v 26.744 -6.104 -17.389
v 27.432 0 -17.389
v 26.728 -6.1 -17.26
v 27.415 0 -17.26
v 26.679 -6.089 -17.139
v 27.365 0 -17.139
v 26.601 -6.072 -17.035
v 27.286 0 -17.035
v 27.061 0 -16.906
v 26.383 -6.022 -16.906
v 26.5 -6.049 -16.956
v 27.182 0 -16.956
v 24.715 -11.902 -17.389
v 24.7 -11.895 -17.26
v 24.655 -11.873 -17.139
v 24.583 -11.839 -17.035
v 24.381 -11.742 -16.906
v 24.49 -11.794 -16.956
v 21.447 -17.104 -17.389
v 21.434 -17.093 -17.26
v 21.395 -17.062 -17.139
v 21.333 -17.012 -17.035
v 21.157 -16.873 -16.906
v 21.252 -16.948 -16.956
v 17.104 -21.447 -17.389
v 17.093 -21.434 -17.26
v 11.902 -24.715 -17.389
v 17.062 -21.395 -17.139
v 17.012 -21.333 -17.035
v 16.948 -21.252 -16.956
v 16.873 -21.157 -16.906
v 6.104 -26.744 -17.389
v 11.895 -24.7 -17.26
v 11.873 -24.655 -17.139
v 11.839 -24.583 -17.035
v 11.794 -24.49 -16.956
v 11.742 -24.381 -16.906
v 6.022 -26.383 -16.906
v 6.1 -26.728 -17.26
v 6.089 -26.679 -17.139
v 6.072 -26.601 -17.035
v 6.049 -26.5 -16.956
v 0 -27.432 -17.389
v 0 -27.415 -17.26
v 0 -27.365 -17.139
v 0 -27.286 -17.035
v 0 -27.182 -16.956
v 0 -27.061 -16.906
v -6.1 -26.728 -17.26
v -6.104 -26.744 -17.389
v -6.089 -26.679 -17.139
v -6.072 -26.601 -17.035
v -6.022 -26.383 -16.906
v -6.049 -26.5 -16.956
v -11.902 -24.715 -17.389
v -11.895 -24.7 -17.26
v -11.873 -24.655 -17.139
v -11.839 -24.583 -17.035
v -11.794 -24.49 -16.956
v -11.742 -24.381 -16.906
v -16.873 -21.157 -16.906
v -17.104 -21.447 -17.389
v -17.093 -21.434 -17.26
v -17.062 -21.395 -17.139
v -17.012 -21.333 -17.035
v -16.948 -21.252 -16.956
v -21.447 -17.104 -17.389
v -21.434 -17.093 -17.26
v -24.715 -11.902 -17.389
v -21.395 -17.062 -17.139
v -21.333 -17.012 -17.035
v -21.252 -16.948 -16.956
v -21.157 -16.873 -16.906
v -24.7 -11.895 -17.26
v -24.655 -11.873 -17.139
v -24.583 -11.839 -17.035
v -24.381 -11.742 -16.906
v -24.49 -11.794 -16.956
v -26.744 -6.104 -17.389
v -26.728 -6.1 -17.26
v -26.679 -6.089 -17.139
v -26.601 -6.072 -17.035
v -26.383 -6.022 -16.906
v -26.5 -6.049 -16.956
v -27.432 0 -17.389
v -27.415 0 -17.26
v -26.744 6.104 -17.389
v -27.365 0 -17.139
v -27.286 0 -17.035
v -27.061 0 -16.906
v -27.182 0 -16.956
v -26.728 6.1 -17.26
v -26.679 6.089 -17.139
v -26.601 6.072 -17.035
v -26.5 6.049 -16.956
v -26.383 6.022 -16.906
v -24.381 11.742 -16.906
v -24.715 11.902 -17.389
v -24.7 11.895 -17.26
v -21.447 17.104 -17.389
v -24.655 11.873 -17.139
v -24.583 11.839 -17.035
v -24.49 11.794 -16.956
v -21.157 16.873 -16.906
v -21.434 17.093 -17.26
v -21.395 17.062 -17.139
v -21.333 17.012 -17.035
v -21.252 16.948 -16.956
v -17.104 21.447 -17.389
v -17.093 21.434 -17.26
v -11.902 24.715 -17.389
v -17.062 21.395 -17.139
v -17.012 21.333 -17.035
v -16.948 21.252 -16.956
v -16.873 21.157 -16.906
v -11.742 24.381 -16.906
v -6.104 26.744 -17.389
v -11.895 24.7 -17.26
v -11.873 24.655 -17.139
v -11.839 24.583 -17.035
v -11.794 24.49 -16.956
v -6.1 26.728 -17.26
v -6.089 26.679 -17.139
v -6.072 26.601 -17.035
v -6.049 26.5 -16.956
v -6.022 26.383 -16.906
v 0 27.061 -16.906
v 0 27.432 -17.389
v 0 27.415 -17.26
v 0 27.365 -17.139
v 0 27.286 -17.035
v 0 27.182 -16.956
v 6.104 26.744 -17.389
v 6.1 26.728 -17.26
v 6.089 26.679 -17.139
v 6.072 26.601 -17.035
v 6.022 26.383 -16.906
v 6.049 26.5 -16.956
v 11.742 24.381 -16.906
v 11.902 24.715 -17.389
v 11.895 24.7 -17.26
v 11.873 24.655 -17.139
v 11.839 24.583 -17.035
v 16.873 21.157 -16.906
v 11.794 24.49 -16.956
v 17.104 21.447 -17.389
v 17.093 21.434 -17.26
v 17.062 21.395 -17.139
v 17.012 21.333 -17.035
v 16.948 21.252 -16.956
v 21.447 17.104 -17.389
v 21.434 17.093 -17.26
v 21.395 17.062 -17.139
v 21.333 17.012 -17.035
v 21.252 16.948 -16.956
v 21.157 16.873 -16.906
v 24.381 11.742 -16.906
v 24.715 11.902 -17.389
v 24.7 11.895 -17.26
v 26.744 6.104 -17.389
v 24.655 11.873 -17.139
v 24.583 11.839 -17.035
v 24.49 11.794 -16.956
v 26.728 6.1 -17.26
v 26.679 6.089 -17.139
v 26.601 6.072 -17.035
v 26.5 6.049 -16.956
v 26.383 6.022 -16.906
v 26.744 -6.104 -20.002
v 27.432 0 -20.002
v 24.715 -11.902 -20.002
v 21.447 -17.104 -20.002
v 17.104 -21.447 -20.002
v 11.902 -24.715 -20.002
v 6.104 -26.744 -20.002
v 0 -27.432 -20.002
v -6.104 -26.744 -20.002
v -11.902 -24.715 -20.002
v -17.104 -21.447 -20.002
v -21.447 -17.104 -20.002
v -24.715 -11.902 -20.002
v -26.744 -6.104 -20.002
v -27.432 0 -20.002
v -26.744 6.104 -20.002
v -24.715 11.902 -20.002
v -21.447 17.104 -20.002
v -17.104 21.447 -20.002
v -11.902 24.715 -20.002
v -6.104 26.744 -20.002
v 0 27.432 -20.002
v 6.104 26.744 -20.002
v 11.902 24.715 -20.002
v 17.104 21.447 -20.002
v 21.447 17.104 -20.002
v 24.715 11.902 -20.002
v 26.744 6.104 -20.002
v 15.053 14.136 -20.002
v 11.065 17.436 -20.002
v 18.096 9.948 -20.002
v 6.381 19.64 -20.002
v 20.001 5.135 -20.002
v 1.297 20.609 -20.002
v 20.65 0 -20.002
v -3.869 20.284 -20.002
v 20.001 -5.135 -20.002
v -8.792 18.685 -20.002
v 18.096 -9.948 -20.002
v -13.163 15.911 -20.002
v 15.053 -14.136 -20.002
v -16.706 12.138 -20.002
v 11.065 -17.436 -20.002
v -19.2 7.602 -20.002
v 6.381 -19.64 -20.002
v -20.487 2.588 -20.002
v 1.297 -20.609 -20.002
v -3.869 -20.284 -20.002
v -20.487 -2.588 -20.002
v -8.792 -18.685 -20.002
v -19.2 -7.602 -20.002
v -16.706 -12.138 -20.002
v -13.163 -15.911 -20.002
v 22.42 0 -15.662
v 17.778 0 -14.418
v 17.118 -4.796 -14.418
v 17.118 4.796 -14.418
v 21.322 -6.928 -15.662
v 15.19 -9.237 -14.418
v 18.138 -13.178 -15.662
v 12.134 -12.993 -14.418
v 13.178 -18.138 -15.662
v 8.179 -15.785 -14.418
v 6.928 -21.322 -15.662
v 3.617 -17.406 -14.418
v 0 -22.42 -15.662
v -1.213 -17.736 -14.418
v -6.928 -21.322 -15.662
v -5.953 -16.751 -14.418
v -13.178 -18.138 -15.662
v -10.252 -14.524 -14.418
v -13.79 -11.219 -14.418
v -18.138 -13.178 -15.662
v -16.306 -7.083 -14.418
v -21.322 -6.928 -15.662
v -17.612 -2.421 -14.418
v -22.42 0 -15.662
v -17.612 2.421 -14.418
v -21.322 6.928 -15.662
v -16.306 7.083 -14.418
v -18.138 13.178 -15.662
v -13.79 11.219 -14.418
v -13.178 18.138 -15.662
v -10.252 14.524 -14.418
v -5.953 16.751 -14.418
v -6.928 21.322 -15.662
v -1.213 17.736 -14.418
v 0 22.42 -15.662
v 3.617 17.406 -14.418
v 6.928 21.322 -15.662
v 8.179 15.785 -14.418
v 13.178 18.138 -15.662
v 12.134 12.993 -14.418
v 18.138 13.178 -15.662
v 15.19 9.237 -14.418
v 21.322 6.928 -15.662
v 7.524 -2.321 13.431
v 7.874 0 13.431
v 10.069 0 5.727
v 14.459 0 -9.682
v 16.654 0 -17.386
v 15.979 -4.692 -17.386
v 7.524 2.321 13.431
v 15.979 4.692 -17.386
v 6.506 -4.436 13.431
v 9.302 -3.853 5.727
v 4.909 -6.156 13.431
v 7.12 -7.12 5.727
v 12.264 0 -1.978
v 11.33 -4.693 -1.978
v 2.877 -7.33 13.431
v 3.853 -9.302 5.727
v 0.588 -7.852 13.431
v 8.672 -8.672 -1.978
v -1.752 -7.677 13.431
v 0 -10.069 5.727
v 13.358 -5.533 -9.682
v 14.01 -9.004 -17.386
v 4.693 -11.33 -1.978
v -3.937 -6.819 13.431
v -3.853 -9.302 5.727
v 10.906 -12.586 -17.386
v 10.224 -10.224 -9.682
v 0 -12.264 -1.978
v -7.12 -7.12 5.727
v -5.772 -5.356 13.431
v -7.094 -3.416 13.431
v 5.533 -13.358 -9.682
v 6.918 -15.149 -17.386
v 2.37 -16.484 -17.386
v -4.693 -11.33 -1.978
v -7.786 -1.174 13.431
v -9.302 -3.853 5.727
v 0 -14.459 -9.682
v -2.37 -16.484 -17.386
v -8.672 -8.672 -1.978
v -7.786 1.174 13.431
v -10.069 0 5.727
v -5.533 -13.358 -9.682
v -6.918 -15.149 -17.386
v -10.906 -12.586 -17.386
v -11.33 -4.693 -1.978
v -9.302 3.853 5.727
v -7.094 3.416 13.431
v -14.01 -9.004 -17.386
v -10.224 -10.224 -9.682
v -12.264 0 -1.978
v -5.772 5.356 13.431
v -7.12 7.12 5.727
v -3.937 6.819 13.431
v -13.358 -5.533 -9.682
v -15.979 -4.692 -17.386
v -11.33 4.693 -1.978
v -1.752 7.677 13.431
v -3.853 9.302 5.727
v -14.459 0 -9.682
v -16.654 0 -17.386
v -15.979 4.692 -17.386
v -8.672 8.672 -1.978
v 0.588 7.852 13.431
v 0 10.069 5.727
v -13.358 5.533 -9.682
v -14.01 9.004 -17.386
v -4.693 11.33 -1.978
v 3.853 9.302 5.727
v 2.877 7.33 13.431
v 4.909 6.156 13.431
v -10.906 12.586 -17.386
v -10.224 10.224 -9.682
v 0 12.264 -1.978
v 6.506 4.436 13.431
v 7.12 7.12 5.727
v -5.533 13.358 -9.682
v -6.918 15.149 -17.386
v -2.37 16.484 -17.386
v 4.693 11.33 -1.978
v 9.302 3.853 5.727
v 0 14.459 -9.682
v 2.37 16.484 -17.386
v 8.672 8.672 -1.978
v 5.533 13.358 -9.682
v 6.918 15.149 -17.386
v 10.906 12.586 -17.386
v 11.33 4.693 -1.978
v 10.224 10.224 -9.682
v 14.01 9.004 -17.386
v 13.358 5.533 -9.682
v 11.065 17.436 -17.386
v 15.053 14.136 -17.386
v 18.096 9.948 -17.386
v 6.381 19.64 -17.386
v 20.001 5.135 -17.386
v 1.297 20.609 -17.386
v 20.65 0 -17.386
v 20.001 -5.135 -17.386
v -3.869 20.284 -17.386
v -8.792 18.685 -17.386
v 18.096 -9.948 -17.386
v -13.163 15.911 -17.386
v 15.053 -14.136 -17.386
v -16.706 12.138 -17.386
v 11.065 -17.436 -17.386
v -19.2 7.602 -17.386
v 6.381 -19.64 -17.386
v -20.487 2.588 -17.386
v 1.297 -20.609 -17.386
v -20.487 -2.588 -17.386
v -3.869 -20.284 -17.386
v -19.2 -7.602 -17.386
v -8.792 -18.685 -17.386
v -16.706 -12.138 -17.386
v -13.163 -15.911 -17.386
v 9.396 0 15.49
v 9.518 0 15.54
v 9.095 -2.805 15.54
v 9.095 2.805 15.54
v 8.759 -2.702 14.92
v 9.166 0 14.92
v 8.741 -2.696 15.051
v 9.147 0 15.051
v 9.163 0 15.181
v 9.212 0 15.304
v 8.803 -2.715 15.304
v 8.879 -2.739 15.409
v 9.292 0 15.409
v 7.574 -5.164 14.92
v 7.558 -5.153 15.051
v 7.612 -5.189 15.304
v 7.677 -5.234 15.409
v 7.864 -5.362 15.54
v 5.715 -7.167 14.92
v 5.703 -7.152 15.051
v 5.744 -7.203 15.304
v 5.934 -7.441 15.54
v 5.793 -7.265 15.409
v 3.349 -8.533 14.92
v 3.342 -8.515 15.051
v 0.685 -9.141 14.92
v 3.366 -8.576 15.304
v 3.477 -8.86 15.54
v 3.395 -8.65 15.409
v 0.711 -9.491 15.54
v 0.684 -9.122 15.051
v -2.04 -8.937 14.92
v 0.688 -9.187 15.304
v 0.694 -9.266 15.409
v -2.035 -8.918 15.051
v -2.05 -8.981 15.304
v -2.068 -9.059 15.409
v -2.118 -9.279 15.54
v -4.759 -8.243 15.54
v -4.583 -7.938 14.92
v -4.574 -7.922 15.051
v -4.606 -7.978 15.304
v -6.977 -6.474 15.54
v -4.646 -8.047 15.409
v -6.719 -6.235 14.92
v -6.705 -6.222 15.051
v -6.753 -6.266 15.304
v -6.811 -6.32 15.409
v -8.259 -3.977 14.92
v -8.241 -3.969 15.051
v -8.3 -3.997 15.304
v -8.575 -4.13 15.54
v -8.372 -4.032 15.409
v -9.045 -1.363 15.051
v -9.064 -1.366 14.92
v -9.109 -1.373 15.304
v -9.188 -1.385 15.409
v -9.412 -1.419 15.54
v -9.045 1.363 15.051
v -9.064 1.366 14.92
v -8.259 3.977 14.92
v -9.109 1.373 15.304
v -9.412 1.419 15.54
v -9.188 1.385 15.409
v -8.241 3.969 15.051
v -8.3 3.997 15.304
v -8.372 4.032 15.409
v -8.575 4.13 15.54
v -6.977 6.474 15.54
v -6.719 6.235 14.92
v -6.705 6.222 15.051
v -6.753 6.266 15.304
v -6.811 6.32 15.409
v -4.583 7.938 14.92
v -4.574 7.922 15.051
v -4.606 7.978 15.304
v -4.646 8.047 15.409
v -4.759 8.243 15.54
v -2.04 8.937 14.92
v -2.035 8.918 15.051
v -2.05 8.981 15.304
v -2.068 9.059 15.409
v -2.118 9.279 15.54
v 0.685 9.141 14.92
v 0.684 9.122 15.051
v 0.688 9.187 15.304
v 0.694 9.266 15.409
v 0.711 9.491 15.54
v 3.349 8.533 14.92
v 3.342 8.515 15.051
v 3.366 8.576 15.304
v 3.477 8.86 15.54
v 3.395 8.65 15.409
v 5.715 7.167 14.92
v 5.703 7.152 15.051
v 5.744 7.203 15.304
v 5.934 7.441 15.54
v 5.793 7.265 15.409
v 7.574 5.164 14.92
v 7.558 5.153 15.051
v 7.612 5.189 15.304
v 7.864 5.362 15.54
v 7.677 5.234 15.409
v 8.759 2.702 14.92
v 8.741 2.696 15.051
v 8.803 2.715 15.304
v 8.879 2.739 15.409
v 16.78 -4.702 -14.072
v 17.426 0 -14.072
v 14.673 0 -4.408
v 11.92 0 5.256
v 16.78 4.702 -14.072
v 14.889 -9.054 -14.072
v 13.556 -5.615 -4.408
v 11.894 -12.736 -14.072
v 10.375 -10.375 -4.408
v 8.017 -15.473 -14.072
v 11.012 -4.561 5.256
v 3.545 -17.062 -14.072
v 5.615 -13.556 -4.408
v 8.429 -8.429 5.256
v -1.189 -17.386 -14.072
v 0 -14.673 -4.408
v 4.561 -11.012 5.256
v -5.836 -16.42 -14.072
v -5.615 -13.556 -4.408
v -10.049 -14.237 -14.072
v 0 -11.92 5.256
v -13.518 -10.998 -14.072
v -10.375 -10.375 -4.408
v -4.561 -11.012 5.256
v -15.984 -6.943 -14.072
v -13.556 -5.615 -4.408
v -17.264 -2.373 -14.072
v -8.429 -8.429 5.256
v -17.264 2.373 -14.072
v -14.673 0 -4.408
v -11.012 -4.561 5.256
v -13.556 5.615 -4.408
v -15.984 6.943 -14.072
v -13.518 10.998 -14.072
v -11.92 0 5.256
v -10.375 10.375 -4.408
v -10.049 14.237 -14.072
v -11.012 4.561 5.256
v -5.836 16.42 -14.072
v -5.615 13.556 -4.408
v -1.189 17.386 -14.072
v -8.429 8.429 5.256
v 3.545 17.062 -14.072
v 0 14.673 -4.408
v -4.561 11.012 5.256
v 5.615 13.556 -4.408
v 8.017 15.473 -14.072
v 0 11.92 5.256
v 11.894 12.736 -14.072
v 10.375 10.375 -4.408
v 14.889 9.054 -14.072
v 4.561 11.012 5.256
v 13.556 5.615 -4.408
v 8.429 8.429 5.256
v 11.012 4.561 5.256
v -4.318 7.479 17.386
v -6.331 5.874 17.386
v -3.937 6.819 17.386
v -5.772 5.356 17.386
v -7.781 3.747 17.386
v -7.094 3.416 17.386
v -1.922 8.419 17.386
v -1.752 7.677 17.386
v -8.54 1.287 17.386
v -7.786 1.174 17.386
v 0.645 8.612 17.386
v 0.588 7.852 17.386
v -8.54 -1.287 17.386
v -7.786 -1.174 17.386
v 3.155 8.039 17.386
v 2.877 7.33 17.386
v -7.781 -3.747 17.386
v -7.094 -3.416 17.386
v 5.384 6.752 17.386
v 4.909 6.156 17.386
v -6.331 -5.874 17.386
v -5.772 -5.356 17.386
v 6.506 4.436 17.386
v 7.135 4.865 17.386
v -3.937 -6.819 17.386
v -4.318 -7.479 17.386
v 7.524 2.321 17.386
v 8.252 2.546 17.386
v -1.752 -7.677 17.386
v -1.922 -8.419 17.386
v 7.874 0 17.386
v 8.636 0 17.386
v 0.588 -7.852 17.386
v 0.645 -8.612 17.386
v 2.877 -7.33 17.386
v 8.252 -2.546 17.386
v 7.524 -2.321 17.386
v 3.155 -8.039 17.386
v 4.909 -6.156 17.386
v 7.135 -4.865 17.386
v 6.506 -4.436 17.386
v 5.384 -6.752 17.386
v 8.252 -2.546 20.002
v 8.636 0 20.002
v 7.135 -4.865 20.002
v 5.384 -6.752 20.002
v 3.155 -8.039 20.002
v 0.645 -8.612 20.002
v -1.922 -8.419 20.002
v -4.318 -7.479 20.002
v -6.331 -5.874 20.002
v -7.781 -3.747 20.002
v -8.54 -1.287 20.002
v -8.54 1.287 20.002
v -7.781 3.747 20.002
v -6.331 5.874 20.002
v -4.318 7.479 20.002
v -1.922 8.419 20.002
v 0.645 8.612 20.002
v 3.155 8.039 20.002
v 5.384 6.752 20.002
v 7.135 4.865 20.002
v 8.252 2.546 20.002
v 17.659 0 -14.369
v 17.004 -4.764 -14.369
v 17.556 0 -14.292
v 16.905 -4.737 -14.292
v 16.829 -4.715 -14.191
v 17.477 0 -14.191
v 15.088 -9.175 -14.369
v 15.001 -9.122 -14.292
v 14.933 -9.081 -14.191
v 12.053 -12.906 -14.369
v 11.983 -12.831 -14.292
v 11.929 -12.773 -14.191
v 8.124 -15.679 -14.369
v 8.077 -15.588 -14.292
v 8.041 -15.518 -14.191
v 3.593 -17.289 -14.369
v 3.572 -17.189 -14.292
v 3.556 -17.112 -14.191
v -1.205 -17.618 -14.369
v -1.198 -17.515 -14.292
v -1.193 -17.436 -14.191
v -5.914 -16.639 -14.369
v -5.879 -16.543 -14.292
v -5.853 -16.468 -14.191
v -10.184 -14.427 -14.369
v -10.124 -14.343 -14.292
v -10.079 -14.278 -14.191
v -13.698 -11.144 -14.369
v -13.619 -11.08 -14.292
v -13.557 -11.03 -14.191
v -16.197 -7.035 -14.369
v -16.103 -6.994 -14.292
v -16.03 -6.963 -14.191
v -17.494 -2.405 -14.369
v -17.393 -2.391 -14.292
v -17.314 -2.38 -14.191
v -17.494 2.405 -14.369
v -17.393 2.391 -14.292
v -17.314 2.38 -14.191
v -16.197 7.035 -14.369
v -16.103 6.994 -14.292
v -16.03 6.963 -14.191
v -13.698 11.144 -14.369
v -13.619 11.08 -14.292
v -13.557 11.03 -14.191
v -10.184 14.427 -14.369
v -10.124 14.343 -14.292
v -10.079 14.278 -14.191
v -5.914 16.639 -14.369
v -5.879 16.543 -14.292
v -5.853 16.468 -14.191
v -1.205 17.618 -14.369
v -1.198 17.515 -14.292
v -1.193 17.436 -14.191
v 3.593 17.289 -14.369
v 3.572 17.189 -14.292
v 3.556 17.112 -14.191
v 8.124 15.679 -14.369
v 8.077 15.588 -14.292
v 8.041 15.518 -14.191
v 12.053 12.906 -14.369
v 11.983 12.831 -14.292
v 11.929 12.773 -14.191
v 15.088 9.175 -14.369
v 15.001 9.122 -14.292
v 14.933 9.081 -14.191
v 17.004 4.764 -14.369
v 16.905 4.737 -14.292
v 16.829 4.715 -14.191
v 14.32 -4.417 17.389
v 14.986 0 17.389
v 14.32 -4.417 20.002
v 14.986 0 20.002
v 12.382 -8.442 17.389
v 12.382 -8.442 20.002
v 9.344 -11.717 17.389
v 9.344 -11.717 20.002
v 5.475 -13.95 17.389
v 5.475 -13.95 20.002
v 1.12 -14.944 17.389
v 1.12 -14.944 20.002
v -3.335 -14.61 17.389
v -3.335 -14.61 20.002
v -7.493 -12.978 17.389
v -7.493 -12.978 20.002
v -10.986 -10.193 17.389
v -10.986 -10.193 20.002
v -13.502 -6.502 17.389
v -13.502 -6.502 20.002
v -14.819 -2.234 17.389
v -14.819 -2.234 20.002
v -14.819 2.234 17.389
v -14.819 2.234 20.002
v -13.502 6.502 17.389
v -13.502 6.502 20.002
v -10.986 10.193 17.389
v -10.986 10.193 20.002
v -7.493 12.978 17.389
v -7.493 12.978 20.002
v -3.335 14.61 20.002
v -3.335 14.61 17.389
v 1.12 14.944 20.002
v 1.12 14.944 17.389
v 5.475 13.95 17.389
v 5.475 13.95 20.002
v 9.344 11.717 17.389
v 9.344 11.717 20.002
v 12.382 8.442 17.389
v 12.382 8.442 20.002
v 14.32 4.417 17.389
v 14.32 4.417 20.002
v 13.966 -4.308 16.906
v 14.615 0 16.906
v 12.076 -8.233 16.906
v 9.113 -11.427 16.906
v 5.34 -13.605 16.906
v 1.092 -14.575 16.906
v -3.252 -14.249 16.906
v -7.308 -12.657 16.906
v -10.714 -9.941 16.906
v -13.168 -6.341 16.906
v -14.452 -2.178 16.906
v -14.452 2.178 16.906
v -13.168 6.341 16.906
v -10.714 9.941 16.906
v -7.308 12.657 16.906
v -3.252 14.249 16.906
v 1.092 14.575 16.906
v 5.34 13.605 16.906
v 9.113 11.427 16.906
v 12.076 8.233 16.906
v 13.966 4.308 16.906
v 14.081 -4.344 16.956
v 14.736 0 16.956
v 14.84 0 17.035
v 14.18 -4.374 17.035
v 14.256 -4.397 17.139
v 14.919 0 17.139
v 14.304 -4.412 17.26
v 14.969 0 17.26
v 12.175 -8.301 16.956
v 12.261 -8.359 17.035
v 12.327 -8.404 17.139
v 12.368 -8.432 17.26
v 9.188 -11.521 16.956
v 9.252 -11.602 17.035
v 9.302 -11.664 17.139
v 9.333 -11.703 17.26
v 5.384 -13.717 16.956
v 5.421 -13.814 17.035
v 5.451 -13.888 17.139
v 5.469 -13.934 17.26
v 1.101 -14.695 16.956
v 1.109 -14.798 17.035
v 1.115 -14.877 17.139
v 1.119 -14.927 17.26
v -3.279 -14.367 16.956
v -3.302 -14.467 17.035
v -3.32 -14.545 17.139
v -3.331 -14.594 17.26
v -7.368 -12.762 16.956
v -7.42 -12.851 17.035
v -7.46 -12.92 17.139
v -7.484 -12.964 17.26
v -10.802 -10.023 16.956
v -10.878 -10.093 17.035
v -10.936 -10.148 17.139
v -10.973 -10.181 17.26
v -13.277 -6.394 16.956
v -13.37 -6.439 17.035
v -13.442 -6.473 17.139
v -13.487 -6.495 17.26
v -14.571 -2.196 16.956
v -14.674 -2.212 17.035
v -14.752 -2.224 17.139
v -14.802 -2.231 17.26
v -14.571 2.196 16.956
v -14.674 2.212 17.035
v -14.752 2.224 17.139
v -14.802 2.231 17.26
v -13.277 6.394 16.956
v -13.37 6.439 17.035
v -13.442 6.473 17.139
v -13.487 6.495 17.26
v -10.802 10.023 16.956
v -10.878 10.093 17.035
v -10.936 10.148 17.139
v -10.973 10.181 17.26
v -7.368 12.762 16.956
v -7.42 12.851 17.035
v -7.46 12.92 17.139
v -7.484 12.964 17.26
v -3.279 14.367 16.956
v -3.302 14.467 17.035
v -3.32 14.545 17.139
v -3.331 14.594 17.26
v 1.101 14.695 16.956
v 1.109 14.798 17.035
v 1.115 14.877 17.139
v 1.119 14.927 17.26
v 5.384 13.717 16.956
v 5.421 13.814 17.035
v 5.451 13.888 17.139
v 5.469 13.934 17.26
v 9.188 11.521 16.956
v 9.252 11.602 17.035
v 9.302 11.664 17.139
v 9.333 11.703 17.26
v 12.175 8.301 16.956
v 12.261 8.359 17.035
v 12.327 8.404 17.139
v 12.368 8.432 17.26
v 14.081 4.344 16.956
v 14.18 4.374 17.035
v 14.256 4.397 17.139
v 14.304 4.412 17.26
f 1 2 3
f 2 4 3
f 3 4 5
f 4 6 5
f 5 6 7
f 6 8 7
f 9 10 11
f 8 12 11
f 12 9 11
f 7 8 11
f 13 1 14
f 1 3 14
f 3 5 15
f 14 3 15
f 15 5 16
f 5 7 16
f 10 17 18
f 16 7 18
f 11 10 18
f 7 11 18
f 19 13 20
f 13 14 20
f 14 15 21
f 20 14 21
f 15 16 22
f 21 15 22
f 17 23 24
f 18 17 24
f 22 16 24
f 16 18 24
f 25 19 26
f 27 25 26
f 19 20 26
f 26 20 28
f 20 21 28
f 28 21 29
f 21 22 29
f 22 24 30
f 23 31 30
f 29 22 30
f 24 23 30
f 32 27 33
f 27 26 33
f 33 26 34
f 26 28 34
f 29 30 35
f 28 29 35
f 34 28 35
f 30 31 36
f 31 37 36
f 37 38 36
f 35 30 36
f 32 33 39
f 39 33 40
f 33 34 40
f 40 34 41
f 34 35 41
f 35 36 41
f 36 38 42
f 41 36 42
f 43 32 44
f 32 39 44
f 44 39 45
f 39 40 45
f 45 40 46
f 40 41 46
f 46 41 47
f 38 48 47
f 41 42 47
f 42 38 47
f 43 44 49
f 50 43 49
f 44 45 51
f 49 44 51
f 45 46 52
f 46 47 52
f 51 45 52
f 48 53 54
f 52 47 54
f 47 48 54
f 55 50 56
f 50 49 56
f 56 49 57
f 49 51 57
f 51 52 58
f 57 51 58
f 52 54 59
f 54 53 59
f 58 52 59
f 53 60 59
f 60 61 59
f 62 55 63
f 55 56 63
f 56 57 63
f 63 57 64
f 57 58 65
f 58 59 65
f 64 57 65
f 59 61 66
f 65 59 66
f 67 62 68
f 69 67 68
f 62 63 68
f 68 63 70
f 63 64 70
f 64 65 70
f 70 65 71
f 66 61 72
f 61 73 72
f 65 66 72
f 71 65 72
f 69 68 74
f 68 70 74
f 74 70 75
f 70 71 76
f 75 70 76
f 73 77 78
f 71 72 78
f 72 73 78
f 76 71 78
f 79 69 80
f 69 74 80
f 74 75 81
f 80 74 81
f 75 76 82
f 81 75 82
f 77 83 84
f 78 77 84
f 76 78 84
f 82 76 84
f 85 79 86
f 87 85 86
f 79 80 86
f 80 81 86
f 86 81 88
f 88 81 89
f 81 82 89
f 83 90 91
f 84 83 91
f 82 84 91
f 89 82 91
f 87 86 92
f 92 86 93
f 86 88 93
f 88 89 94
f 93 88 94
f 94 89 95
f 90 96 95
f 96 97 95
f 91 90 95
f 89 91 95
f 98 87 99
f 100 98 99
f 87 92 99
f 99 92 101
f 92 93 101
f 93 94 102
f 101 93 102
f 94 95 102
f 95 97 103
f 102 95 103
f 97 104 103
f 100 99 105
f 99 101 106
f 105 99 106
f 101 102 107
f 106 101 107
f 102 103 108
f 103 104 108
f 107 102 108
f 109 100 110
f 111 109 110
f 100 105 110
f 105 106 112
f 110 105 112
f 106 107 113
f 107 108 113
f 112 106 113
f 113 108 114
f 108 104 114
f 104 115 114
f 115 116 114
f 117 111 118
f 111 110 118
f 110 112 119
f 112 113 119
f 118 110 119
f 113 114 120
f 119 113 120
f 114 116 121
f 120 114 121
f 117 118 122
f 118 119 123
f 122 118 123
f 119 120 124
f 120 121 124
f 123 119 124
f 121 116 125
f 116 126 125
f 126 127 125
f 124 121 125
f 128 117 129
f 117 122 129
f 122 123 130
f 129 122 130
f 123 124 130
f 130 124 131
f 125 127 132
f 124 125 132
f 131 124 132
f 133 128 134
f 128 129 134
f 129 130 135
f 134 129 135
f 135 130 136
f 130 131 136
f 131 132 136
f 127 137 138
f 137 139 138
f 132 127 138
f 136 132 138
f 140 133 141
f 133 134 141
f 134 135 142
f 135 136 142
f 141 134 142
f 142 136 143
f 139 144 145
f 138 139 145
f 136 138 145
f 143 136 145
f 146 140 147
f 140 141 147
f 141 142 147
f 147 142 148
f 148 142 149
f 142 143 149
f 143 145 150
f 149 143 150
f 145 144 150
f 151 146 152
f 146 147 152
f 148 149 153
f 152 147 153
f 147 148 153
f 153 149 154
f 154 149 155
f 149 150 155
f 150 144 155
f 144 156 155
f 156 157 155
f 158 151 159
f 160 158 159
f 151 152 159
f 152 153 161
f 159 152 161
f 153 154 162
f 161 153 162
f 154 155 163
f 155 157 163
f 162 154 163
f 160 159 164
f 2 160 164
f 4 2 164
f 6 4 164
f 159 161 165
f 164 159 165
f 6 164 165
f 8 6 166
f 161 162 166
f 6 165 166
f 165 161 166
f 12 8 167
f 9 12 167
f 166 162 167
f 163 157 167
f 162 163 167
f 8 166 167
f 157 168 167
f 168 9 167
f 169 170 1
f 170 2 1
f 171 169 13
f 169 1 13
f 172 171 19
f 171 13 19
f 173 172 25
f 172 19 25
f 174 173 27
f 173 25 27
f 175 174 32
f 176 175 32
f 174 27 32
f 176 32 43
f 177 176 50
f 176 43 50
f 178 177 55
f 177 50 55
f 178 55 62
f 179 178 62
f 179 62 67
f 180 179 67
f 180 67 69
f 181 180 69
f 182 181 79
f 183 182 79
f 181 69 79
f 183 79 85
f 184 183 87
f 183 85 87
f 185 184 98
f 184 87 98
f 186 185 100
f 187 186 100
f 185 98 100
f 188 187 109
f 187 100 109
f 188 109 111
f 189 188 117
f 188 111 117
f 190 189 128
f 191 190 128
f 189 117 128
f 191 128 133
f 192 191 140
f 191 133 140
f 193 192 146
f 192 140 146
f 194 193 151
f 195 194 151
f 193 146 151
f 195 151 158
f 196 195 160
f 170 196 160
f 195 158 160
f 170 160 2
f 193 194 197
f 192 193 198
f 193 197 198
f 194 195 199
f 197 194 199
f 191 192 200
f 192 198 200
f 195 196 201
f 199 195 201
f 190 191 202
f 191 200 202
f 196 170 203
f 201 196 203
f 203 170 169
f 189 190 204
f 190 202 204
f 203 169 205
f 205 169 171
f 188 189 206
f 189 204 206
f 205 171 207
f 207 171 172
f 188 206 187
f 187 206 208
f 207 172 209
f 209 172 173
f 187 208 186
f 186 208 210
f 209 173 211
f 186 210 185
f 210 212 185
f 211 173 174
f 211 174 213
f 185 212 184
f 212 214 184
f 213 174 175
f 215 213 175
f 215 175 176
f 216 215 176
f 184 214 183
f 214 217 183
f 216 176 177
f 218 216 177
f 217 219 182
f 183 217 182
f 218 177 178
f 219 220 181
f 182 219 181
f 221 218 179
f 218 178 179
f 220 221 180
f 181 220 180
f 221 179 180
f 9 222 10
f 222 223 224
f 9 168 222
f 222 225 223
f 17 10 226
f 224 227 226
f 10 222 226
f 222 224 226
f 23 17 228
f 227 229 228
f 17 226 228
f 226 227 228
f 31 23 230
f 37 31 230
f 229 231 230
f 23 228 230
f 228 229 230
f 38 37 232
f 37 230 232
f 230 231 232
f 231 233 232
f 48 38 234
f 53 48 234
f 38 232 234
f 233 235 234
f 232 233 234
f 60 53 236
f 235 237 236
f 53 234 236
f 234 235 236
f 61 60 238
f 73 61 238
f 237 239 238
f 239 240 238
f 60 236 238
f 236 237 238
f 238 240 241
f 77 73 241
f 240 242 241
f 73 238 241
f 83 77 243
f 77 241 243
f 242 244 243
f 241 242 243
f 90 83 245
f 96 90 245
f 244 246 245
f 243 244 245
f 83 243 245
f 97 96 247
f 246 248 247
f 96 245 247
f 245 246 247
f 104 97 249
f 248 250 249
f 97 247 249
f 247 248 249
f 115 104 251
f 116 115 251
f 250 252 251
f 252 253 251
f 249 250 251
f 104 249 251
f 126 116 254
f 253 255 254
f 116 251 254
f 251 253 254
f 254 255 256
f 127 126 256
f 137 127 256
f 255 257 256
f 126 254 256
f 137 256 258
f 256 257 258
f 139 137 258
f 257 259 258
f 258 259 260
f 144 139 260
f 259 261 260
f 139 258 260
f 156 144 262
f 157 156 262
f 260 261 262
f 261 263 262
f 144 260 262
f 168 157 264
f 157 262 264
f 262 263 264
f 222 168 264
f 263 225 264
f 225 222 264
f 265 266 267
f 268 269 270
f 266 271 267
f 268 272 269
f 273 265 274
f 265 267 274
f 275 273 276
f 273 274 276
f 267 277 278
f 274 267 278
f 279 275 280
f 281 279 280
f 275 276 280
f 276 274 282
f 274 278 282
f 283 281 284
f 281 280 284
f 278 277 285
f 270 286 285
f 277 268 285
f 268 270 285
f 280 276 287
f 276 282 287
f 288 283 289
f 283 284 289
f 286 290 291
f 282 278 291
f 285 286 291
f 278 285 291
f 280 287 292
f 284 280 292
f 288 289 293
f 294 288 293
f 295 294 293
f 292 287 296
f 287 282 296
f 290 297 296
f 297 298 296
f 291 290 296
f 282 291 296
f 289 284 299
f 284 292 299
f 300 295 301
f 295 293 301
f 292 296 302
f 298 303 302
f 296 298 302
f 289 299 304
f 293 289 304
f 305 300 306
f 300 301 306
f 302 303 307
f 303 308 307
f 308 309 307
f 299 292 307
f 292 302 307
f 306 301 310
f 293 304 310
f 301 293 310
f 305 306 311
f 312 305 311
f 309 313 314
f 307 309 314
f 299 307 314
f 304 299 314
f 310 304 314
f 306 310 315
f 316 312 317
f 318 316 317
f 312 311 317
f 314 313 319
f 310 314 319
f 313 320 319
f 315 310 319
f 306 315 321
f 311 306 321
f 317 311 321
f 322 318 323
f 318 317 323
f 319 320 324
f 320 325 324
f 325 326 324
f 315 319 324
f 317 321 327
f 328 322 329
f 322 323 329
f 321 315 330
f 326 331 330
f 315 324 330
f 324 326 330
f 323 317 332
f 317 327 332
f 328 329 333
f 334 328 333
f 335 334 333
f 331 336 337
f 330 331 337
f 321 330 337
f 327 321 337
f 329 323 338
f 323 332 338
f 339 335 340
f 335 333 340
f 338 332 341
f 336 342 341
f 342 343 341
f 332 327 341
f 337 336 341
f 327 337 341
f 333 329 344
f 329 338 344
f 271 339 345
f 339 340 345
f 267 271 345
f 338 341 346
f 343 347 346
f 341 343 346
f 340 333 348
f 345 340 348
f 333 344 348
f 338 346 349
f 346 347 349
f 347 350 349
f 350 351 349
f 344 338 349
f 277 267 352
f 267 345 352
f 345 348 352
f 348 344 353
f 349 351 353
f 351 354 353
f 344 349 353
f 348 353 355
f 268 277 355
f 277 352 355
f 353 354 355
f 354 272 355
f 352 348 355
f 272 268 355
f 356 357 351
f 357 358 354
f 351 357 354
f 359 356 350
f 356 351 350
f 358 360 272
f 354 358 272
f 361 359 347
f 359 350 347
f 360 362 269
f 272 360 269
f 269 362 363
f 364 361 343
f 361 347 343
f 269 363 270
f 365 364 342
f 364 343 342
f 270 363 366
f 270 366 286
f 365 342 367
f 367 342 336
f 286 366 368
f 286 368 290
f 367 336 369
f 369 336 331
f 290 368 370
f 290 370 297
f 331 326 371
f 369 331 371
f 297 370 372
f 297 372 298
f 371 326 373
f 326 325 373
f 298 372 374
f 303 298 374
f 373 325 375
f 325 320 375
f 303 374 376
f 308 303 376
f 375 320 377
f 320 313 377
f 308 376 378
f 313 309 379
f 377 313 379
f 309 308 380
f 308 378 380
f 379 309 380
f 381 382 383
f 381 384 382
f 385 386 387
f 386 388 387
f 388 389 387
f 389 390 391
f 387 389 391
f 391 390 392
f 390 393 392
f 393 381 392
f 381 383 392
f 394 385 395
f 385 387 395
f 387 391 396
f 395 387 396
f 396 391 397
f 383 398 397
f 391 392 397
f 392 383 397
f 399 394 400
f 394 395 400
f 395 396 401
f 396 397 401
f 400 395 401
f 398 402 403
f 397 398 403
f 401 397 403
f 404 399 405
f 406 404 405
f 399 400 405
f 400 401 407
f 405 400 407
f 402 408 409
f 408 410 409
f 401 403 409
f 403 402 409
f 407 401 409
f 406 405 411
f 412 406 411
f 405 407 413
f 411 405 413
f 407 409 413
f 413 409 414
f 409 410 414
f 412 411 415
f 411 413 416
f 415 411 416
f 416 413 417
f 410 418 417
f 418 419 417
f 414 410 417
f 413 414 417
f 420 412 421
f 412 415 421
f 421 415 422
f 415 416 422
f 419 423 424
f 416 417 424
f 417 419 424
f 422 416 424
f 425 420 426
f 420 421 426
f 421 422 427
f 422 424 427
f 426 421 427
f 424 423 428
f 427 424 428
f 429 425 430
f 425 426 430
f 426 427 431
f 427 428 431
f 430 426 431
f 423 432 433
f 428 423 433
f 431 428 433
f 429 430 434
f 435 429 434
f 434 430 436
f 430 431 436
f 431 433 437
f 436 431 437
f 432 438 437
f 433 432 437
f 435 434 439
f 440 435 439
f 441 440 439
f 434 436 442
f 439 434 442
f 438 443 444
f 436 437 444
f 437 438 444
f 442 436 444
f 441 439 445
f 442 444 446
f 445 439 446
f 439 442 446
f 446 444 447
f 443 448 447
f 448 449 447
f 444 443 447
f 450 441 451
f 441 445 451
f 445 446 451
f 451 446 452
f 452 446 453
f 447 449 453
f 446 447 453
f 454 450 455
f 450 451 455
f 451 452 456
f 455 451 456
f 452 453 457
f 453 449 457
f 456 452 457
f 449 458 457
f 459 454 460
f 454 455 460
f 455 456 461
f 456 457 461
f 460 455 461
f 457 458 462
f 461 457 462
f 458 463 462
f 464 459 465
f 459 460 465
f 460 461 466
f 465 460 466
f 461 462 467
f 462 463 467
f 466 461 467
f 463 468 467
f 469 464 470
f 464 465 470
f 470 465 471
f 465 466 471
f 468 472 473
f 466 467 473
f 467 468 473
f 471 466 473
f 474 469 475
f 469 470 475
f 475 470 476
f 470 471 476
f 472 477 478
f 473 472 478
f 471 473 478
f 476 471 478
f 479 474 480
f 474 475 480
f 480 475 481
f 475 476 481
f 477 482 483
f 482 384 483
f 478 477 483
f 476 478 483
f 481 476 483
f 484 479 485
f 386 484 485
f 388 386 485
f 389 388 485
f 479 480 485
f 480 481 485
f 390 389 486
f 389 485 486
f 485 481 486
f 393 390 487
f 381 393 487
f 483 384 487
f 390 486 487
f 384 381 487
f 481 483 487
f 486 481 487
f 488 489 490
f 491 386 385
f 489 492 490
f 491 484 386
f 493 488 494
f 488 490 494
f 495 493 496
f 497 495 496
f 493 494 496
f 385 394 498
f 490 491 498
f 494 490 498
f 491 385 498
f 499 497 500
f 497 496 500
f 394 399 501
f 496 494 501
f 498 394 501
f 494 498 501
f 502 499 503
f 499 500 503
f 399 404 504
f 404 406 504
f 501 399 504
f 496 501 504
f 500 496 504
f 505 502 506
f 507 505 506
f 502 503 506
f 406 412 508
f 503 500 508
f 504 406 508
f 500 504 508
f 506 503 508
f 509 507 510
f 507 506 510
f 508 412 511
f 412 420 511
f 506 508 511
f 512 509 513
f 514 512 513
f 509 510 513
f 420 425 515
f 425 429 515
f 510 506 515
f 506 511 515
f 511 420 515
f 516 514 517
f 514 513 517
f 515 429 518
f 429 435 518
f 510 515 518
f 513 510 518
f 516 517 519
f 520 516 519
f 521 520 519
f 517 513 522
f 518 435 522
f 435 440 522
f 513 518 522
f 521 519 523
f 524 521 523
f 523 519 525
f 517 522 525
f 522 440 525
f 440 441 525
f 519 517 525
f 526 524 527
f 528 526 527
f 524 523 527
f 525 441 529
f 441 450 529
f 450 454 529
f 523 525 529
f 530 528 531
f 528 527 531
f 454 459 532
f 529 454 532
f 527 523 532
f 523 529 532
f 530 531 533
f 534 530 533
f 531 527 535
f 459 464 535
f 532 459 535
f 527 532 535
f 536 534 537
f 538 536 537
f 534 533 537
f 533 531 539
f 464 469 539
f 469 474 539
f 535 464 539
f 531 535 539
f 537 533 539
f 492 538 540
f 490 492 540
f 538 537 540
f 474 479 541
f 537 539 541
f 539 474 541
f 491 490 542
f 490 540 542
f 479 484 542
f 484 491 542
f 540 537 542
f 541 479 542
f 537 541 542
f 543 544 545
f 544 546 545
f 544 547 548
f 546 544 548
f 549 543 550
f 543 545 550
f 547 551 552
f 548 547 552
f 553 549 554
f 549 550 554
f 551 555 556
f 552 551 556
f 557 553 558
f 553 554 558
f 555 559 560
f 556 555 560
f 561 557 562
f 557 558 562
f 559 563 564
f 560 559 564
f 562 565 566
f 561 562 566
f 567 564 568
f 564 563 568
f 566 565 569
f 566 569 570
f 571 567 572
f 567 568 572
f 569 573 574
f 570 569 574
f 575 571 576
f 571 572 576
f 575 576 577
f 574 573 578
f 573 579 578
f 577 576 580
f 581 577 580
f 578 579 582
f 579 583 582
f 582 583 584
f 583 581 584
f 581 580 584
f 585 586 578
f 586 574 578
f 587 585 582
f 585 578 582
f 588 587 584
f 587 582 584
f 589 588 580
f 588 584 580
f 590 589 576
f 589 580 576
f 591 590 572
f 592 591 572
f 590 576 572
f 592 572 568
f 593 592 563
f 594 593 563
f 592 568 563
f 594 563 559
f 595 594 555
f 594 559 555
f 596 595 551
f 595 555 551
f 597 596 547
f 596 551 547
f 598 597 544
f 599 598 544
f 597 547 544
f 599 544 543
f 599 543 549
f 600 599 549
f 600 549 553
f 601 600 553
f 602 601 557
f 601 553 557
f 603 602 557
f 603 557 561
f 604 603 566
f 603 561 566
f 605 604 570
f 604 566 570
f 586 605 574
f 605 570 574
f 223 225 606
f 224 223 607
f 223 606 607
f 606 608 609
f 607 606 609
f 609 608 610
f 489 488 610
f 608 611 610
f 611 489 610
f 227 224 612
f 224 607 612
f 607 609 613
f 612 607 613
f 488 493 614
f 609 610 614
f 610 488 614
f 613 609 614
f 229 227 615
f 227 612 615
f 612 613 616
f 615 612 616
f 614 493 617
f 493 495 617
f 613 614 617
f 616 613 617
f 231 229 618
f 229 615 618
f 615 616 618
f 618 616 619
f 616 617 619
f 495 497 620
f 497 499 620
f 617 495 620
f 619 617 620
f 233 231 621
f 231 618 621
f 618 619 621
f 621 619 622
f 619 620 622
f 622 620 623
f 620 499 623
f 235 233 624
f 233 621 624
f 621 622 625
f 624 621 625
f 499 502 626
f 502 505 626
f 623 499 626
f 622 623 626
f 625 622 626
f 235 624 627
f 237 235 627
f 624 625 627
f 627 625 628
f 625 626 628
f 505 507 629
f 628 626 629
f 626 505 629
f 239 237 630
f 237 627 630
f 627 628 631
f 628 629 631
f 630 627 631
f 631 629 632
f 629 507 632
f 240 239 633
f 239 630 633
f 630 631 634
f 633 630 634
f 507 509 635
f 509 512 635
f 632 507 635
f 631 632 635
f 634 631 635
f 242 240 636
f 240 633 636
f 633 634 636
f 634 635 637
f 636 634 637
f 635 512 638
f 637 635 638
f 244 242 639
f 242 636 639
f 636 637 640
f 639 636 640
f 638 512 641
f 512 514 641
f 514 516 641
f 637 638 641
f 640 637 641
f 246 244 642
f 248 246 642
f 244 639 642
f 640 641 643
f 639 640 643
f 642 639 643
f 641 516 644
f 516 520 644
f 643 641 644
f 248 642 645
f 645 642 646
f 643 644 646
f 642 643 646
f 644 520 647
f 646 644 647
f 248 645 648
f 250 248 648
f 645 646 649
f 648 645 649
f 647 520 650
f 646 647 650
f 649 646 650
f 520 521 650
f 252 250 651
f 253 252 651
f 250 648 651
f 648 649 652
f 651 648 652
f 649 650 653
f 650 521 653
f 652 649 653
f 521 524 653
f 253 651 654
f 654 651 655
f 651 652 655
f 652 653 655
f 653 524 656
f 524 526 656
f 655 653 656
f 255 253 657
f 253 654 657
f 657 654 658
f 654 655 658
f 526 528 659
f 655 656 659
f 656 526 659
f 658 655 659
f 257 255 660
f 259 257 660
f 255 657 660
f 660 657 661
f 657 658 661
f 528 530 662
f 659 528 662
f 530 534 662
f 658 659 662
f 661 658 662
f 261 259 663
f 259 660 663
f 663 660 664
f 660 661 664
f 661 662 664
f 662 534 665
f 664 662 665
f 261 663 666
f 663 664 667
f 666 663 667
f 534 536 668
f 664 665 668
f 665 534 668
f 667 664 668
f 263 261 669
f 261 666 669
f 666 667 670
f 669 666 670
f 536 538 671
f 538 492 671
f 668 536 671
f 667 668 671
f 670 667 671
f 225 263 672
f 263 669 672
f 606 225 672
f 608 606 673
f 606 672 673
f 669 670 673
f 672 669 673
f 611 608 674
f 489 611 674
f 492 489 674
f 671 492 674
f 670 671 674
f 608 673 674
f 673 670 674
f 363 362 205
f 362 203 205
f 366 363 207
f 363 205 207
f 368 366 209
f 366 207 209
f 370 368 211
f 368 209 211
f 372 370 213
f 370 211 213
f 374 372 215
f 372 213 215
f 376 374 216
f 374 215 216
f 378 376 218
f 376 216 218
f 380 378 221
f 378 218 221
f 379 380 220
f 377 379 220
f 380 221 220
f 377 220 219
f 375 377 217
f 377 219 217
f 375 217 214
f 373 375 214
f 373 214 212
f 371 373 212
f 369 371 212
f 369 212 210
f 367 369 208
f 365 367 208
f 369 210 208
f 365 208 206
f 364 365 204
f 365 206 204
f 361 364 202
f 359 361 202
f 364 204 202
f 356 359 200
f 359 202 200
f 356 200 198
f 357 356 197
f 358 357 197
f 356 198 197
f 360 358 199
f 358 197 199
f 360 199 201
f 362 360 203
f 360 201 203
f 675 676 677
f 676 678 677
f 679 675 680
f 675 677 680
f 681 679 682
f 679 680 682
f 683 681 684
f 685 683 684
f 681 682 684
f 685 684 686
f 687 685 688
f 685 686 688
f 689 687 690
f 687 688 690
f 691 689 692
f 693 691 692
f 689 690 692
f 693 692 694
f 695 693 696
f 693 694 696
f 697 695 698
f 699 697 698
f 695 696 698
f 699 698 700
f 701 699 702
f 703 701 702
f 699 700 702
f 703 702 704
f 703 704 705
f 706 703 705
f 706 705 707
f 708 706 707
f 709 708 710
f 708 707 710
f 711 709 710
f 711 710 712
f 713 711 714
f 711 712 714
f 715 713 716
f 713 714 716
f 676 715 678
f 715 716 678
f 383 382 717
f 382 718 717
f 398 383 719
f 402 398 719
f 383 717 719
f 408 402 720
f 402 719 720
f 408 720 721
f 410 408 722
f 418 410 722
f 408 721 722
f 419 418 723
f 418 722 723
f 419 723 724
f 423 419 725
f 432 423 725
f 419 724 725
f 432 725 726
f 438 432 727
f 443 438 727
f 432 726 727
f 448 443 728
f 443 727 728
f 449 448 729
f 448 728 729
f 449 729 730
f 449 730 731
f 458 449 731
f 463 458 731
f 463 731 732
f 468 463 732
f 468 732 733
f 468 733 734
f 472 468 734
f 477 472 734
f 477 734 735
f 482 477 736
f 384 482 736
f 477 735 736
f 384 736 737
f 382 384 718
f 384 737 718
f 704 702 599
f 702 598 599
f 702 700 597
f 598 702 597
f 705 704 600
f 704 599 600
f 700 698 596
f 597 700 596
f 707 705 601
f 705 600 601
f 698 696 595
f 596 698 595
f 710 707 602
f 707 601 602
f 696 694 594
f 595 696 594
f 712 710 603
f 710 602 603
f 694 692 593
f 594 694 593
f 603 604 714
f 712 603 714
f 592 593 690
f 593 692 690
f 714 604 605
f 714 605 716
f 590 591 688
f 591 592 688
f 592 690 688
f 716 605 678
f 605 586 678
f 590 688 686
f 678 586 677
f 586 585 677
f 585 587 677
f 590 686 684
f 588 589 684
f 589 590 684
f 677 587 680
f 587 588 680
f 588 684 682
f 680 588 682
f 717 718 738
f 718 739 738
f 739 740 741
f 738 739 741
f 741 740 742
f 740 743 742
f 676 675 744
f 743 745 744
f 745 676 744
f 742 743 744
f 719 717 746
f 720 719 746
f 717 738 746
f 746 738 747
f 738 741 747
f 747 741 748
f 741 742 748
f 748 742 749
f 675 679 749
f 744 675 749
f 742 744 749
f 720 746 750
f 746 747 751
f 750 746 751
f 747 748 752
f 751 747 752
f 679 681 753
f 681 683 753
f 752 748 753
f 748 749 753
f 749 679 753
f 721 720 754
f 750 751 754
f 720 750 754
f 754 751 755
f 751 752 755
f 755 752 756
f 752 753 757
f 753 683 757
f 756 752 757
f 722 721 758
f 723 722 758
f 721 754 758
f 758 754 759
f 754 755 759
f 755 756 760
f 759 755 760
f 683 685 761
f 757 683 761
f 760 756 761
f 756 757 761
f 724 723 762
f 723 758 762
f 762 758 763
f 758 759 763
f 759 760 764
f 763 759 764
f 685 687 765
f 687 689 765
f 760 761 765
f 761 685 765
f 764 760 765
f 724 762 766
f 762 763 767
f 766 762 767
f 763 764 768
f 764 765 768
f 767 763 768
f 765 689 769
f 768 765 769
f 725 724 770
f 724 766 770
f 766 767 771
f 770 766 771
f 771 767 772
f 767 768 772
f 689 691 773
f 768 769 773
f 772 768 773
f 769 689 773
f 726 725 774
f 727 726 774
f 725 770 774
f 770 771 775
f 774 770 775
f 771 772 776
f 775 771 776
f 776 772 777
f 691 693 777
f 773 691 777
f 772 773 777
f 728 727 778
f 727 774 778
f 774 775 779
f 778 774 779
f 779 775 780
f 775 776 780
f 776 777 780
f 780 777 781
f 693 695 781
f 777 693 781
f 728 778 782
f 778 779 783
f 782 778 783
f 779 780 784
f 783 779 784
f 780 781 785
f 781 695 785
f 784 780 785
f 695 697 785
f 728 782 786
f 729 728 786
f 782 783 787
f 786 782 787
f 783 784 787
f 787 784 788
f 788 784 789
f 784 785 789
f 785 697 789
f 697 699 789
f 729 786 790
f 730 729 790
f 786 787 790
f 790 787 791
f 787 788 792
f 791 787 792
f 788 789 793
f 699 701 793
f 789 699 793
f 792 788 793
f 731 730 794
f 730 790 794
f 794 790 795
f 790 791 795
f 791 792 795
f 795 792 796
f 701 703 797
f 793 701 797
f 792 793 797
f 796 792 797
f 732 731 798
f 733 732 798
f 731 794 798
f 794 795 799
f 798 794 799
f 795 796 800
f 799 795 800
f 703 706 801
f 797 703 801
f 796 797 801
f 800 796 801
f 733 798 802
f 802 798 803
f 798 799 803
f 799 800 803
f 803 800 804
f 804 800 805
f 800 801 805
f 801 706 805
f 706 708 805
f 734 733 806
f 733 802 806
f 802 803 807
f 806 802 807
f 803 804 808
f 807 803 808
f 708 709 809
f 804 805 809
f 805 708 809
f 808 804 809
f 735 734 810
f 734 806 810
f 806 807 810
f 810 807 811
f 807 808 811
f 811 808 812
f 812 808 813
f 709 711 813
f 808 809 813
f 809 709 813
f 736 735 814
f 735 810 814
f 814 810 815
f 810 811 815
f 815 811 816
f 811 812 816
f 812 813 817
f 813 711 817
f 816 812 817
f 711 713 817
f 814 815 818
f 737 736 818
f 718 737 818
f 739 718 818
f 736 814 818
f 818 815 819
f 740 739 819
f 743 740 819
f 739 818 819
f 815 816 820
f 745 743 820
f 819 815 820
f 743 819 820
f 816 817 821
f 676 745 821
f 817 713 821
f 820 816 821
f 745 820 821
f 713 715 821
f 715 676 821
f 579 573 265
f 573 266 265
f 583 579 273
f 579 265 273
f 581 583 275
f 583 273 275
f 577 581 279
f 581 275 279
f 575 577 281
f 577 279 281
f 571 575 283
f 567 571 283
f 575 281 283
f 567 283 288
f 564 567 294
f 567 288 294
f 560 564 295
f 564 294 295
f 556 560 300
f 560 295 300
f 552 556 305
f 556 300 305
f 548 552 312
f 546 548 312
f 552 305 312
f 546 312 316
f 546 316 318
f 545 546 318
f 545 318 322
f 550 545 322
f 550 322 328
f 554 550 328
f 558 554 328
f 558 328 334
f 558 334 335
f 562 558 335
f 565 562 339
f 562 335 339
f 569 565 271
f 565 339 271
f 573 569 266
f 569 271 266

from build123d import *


with BuildPart() as part:
    # Sketch2 → Revolve1 (revolve)
    with BuildSketch(Plane(origin=(0, 0, 0), x_dir=(0, 0, -1), z_dir=(1, 0, 0)), mode=Mode.PRIVATE) as revolve1_sk:
        with BuildLine():
            Line((20.0025, 27.432), (17.388963494, 27.432))
            ThreePointArc((17.388963494, 27.432), (17.084582779, 27.32867667), (16.906000581, 27.061409523))
            Line((16.906000581, 27.061409523), (14.418444847, 17.777725139))
            ThreePointArc((14.418444847, 17.777725139), (14.291807056, 17.556374904), (14.072477617, 17.426268585))
            Line((14.072477617, 17.426268585), (-14.920169656, 9.16644804))
            ThreePointArc((-14.920169656, 9.16644804), (-15.30374952, 9.212347173), (-15.540128252, 9.517904594))
            Line((-15.540128252, 9.517904594), (-16.906000581, 14.615409523))
            ThreePointArc((-16.906000581, 14.615409523), (-17.084582779, 14.88267667), (-17.388963494, 14.986))
            Line((-17.388963494, 14.986), (-20.0025, 14.986))
            Line((-20.0025, 14.986), (-20.0025, 8.636))
            Line((-20.0025, 8.636), (-17.3863, 8.636))
            Line((-17.3863, 8.636), (-17.3863, 7.874))
            Line((-17.3863, 7.874), (-13.431030881, 7.874))
            Line((-13.431030881, 7.874), (17.3863, 16.653661283))
            Line((17.3863, 16.653661283), (17.3863, 20.6502))
            Line((17.3863, 20.6502), (20.0025, 20.6502))
            Line((20.0025, 20.6502), (20.0025, 27.432))
        make_face()
    revolve(revolve1_sk.sketch.rotate(Axis((0, 0, 20.0025), (0, 0, -1)), 90), axis=Axis((0, 0, 20.0025), (0, 0, -1)))


solid = part.part
